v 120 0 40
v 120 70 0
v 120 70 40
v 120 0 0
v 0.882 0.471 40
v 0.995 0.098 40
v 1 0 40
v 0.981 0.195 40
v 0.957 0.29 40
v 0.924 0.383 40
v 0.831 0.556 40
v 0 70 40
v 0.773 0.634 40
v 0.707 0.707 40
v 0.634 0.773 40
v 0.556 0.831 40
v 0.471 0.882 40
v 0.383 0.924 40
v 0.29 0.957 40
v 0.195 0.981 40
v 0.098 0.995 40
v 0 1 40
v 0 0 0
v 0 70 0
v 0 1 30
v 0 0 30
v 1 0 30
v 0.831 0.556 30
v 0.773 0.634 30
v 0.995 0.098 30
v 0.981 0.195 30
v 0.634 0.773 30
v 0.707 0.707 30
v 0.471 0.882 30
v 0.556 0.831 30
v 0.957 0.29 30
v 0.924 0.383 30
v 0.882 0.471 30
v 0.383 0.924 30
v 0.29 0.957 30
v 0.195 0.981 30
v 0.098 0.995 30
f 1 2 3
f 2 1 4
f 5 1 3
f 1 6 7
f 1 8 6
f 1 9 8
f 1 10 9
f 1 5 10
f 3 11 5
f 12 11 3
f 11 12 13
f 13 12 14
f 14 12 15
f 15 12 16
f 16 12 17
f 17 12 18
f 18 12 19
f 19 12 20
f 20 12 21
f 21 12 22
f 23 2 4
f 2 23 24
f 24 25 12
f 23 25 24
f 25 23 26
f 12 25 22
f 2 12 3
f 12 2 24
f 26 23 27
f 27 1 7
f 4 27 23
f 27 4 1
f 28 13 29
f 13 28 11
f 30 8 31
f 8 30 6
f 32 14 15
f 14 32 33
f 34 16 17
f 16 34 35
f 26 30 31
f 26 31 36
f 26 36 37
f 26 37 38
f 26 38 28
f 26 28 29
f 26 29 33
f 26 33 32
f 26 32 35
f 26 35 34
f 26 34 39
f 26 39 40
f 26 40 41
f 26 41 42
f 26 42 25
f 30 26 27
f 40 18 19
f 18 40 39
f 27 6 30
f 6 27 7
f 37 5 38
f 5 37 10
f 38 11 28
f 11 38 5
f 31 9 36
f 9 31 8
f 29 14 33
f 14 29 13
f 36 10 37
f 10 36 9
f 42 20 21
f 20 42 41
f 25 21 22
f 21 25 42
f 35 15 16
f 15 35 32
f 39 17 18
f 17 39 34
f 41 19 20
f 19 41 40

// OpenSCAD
// Mini Horizontal Gel Electrophoresis Buffer Tank
// Outer dimensions: 120 (X) x 70 (Y) x 40 (Z)
// Wall thickness: 3 mm
// Floor thickness: 3 mm
// Inner platform: 60 (X) x 70 (Y) x 10 (height from inner floor)
// Electrode holes: 2 mm diameter, horizontal along X, at Y=0, Z=30 (outer coords)

$fn = 64;

// --- Dimensions ---
X_out = 120;
Y_out = 70;
Z_out = 40;
wall  = 3;
floor = 3;

// --- Calculated Inner Dimensions ---
X_in  = X_out - 2 * wall;
Y_in  = Y_out - 2 * wall;
Z_in  = Z_out - floor; // Inner floor is at Z = floor

// --- Platform Dimensions ---
plat_len = 60;
plat_w   = Y_in;     // Spans full inner width
plat_h   = 10;       // Height above inner floor
plat_z   = floor + plat_h; // Absolute Z position of platform top

// --- Electrode Hole Dimensions ---
hole_d   = 2;
hole_y   = 0;        // Center of hole in Y (as per spec)
hole_z   = 30;       // Center of hole in Z (as per spec)

// --- Helper: Create the main tank body ---
module tank_body() {
    // Outer box
    translate([0, 0, 0]) cube([X_out, Y_out, Z_out]);
    
    // Cut out the inner volume (air space)
    // Inner box starts at wall, goes to X_in, Y_in, Z_in
    translate([wall, wall, floor]) cube([X_in, Y_in, Z_in]);
}

// --- Helper: Create the raised platform ---
module platform() {
    // Platform sits on the inner floor.
    // Bottom of platform is at Z = floor.
    // Top of platform is at Z = floor + plat_h.
    // It spans the full inner width (Y_in) and is centered in X.
    
    translate([
        (X_out - plat_len) / 2, 
        wall, 
        floor
    ]) cube([plat_len, plat_w, plat_h]);
}

// --- Helper: Create the electrode hole ---
// The hole is horizontal along X.
// It passes through the end walls at Y = 0 and Y = Y_out.
// The center of the hole is at Y = hole_y, Z = hole_z.
// We need to cut a cylinder of diameter hole_d, length X_out, 
// centered at the specific Y and Z.
module electrode_hole() {
    // Cylinder axis is X.
    // Center of cylinder:
    // X: 0 (centered)
    // Y: hole_y
    // Z: hole_z
    // Extend slightly past the tank ends (X=0 and X=X_out) to ensure clean cut
    translate([0, hole_y, hole_z]) cylinder(h = X_out + 2, d = hole_d);
}

// --- Main Assembly ---
difference() {
    union() {
        tank_body();
        platform();
    }
    
    // Cut the electrode holes
    // We need to cut through the end walls.
    // The hole is defined as a cylinder along X.
    // Since we are in a difference(), this cylinder will cut through the tank.
    // We must ensure the cylinder extends slightly past the tank faces to ensure clean cuts.
    translate([0, hole_y, hole_z]) cylinder(h = X_out + 2, d = hole_d);
}
